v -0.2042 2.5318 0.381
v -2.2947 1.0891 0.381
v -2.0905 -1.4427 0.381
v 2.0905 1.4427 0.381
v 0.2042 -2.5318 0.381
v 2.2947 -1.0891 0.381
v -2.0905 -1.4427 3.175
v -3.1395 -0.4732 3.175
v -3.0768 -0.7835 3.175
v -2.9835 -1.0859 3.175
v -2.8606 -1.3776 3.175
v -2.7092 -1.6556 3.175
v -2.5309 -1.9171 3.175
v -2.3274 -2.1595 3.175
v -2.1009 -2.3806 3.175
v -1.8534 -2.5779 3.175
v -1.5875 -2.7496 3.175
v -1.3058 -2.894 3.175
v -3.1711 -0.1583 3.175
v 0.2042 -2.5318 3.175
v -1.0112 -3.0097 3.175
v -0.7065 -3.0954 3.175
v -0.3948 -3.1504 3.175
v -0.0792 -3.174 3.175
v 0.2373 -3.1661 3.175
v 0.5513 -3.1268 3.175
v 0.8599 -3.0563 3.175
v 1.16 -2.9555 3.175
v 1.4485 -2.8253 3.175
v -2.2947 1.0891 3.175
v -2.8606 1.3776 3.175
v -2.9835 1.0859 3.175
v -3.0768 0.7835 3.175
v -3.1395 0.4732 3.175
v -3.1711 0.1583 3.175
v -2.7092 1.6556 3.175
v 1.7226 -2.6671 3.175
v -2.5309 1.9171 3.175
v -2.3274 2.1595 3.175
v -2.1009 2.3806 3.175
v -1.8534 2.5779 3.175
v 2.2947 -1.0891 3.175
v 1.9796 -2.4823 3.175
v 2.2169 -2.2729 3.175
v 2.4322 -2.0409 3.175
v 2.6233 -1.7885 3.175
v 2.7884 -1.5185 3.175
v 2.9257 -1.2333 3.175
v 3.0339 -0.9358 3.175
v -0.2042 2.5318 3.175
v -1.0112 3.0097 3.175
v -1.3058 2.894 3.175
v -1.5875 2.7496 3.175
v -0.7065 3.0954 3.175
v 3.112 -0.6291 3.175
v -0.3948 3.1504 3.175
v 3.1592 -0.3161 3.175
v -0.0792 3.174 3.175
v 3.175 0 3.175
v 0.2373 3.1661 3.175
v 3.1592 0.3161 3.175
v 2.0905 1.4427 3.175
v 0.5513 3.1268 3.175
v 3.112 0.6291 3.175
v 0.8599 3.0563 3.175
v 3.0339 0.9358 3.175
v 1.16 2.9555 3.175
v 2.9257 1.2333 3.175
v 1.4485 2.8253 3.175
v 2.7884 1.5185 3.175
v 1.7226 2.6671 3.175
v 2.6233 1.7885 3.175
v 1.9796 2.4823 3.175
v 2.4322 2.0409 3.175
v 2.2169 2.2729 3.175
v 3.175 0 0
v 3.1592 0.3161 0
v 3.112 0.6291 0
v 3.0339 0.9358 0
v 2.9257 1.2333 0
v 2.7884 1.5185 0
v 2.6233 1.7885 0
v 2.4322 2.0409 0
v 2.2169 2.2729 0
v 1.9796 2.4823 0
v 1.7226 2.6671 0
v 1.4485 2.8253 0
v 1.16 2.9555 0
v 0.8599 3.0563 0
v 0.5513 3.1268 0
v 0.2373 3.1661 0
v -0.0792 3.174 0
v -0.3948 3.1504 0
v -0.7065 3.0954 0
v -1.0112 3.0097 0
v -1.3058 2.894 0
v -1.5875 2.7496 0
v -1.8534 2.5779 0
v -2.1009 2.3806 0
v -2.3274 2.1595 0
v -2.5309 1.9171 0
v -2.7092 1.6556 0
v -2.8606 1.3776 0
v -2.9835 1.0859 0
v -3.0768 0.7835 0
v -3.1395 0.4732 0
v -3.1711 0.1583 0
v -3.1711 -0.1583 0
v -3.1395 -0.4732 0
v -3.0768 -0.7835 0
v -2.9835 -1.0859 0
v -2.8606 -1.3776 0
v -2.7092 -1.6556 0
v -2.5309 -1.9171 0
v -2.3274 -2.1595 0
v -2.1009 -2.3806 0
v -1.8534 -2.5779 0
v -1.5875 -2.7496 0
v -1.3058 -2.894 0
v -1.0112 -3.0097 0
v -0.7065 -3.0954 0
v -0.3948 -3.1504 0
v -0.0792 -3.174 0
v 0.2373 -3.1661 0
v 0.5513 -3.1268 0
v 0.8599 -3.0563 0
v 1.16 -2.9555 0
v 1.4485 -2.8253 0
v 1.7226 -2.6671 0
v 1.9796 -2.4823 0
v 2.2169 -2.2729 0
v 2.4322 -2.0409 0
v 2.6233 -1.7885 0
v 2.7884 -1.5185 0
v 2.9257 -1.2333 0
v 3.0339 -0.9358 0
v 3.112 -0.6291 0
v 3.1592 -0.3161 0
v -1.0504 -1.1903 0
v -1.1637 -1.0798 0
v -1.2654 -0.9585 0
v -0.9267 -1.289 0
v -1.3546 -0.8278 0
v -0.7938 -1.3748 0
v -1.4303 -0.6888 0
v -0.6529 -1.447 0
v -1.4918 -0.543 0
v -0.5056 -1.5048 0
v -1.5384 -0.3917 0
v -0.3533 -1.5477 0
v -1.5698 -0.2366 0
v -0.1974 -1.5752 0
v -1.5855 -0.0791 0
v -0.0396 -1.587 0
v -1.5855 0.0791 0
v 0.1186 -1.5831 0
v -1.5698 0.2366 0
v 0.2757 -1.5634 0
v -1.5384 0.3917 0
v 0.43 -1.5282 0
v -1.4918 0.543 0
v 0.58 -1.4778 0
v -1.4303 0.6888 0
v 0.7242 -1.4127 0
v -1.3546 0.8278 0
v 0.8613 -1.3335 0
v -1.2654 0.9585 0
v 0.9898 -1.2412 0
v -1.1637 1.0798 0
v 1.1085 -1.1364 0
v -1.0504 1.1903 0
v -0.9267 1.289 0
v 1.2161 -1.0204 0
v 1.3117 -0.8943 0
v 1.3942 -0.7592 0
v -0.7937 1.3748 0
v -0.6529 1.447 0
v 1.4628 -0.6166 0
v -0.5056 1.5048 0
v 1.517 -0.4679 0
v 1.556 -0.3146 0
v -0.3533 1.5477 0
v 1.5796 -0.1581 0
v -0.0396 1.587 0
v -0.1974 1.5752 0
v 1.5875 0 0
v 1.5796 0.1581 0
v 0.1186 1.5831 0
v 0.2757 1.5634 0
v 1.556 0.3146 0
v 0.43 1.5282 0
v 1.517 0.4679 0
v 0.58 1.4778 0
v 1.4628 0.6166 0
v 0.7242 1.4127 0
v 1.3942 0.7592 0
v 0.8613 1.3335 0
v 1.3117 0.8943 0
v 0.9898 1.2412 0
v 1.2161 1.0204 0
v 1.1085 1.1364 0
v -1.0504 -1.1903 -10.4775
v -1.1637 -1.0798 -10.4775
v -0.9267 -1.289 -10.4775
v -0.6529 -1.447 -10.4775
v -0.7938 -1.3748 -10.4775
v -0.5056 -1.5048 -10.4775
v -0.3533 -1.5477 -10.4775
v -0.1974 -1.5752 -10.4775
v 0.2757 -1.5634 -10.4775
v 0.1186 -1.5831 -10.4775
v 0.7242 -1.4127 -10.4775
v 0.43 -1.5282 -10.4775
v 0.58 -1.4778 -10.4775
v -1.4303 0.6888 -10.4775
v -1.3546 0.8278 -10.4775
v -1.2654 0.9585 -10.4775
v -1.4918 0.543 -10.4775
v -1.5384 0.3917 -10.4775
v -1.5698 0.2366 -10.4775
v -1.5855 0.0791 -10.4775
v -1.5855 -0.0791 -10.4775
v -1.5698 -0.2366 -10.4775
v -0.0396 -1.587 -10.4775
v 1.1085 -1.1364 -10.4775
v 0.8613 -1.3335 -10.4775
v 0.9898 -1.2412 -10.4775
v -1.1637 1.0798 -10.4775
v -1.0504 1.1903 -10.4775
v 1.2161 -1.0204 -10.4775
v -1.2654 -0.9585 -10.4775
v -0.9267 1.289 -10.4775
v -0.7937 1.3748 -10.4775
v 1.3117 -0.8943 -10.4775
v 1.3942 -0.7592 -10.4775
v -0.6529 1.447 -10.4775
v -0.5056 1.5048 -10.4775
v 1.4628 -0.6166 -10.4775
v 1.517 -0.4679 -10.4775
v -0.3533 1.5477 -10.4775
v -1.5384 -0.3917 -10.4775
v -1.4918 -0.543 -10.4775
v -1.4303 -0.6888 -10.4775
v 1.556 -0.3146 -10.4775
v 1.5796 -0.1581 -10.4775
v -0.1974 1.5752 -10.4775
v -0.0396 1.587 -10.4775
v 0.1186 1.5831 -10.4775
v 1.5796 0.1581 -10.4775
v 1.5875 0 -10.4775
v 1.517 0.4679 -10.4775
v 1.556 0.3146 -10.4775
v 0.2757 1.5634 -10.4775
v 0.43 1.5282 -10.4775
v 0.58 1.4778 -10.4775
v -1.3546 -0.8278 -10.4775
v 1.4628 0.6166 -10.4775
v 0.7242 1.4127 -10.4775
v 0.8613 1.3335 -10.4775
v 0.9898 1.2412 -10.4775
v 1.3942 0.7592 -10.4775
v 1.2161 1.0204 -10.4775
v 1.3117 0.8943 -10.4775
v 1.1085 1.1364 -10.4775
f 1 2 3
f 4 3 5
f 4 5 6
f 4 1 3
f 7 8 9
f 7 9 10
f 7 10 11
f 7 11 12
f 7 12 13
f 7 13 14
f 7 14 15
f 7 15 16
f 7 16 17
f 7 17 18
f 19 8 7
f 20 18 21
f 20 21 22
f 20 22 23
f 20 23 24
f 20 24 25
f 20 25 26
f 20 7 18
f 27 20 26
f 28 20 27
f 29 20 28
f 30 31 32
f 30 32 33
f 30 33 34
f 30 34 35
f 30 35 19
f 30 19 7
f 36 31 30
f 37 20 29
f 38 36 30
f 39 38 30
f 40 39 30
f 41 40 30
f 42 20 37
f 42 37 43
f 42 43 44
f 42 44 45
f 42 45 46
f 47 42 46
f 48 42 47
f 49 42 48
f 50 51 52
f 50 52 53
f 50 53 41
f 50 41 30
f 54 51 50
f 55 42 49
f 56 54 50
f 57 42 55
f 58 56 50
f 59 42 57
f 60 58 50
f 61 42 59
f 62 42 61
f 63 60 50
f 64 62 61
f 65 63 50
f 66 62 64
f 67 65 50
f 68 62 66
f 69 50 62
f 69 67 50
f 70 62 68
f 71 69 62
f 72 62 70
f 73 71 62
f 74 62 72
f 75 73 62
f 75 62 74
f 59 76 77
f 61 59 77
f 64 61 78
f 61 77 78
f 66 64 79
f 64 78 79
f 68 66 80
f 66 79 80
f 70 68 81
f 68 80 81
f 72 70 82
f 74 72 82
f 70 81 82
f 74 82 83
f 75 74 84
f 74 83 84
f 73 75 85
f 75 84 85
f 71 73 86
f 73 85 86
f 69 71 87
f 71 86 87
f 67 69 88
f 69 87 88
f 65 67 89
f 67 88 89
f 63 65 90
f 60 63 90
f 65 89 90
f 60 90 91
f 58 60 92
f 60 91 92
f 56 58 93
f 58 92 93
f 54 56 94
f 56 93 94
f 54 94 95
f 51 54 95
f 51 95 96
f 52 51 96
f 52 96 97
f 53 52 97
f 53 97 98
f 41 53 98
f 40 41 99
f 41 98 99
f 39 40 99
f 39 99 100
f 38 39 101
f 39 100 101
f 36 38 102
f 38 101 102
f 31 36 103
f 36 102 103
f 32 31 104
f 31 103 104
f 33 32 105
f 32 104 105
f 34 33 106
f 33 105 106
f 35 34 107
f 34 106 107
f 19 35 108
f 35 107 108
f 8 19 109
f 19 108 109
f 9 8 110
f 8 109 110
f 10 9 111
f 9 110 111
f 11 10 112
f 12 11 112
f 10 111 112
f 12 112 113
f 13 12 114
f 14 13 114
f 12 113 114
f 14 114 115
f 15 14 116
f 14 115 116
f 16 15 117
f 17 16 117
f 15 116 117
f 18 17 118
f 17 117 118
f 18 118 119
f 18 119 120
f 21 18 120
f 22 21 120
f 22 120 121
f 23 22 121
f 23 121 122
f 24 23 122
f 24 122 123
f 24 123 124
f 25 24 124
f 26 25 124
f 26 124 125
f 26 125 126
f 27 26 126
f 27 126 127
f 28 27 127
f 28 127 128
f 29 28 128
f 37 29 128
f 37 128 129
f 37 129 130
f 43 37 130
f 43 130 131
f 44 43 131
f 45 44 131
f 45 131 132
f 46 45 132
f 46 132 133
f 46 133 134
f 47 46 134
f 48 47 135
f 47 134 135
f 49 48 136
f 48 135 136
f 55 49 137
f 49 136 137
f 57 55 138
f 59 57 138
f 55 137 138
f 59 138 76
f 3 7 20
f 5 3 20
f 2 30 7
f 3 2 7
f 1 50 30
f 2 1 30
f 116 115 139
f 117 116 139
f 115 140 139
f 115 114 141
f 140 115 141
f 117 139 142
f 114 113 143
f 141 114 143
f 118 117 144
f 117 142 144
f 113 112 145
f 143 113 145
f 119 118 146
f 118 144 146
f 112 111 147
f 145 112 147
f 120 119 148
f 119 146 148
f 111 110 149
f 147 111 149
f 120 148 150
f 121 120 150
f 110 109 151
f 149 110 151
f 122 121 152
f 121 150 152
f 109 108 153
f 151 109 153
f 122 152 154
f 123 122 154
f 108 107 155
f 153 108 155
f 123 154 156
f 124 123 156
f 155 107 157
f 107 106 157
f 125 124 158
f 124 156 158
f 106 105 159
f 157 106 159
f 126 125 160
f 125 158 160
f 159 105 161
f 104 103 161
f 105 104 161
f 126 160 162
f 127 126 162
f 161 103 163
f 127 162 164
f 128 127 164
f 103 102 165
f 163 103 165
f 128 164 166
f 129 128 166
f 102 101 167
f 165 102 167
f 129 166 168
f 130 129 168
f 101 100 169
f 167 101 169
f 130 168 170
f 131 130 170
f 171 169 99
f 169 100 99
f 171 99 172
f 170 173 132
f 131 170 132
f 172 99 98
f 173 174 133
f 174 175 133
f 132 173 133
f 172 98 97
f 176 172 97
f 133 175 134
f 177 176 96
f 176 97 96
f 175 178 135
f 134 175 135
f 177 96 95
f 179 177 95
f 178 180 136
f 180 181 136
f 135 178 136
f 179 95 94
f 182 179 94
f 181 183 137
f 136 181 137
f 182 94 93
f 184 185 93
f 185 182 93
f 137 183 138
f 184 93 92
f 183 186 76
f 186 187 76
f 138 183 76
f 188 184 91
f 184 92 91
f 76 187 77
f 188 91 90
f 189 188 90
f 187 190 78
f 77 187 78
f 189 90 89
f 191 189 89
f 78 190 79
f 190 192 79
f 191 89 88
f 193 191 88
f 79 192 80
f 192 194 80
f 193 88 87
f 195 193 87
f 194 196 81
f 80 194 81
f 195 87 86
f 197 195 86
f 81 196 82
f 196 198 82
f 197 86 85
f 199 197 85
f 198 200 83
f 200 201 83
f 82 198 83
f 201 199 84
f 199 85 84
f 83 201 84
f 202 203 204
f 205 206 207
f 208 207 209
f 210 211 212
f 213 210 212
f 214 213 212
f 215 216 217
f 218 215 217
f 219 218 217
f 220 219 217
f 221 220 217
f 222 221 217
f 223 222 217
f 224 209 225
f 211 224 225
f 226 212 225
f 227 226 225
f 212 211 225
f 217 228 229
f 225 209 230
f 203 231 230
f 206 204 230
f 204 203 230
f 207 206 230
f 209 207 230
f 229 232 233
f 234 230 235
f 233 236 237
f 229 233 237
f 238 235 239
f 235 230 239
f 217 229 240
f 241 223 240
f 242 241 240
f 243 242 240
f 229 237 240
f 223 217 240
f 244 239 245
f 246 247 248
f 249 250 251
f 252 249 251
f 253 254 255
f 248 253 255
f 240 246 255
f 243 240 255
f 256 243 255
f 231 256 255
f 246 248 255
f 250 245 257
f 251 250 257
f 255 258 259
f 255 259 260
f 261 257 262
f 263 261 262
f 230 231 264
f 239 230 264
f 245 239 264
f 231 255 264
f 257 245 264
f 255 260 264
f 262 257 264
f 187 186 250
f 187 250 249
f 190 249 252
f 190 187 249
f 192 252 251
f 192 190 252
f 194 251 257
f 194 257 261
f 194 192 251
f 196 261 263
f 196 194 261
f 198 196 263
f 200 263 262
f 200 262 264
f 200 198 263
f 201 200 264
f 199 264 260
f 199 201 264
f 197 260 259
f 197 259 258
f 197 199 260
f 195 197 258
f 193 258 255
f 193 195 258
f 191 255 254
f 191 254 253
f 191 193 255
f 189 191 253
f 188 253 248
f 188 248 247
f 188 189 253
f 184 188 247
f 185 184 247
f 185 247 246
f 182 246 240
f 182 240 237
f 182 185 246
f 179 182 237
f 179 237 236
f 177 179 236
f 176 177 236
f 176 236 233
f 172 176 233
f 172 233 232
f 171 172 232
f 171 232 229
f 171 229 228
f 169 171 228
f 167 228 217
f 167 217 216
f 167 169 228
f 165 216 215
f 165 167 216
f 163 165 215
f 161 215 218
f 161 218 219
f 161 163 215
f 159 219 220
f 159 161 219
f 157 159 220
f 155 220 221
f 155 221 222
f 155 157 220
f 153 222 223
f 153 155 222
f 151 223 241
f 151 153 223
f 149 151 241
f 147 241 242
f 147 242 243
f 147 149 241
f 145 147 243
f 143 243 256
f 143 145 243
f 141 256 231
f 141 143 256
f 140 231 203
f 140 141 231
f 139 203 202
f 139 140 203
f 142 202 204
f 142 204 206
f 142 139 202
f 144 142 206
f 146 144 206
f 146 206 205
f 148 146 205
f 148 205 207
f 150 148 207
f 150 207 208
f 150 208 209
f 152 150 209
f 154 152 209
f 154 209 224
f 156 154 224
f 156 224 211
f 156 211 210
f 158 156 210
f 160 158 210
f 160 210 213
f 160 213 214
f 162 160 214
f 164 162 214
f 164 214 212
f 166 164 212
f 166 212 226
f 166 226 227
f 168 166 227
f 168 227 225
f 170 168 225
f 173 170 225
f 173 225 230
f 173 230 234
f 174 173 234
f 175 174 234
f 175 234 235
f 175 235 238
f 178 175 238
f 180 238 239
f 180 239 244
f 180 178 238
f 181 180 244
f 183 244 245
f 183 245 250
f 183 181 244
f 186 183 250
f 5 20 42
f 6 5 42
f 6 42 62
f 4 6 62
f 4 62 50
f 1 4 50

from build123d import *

# Parameters (mm, degrees)
CROQUIS1_R              = 1.5875
SALIENTE_EXTRUIR1_DEPTH = 10.4775
CROQUIS2_R              = 3.175
SALIENTE_EXTRUIR2_DEPTH = 3.175
CORTAR_EXTRUIR5_DEPTH   = 2.794


with BuildPart() as part:
    # Croquis1 → Saliente-Extruir1 (new body)
    with BuildSketch(Plane.XY):
        Circle(CROQUIS1_R)
    extrude(amount=-SALIENTE_EXTRUIR1_DEPTH)

    # Croquis2 → Saliente-Extruir2 (add)
    with BuildSketch(Plane.XY):
        Circle(CROQUIS2_R)
    extrude(amount=SALIENTE_EXTRUIR2_DEPTH)

    # Croquis3 → Cortar-Extruir5 (cut)
    with BuildSketch(Plane.XY.offset(3.175)):
        Polygon((2.294680271, -1.089055764), (2.090490093, 1.442723526), (-0.204190178, 2.53177929), (-2.294680271, 1.089055764), (-2.090490093, -1.442723526), (0.204190178, -2.53177929), align=None)
    extrude(amount=-CORTAR_EXTRUIR5_DEPTH, mode=Mode.SUBTRACT)


solid = part.part
